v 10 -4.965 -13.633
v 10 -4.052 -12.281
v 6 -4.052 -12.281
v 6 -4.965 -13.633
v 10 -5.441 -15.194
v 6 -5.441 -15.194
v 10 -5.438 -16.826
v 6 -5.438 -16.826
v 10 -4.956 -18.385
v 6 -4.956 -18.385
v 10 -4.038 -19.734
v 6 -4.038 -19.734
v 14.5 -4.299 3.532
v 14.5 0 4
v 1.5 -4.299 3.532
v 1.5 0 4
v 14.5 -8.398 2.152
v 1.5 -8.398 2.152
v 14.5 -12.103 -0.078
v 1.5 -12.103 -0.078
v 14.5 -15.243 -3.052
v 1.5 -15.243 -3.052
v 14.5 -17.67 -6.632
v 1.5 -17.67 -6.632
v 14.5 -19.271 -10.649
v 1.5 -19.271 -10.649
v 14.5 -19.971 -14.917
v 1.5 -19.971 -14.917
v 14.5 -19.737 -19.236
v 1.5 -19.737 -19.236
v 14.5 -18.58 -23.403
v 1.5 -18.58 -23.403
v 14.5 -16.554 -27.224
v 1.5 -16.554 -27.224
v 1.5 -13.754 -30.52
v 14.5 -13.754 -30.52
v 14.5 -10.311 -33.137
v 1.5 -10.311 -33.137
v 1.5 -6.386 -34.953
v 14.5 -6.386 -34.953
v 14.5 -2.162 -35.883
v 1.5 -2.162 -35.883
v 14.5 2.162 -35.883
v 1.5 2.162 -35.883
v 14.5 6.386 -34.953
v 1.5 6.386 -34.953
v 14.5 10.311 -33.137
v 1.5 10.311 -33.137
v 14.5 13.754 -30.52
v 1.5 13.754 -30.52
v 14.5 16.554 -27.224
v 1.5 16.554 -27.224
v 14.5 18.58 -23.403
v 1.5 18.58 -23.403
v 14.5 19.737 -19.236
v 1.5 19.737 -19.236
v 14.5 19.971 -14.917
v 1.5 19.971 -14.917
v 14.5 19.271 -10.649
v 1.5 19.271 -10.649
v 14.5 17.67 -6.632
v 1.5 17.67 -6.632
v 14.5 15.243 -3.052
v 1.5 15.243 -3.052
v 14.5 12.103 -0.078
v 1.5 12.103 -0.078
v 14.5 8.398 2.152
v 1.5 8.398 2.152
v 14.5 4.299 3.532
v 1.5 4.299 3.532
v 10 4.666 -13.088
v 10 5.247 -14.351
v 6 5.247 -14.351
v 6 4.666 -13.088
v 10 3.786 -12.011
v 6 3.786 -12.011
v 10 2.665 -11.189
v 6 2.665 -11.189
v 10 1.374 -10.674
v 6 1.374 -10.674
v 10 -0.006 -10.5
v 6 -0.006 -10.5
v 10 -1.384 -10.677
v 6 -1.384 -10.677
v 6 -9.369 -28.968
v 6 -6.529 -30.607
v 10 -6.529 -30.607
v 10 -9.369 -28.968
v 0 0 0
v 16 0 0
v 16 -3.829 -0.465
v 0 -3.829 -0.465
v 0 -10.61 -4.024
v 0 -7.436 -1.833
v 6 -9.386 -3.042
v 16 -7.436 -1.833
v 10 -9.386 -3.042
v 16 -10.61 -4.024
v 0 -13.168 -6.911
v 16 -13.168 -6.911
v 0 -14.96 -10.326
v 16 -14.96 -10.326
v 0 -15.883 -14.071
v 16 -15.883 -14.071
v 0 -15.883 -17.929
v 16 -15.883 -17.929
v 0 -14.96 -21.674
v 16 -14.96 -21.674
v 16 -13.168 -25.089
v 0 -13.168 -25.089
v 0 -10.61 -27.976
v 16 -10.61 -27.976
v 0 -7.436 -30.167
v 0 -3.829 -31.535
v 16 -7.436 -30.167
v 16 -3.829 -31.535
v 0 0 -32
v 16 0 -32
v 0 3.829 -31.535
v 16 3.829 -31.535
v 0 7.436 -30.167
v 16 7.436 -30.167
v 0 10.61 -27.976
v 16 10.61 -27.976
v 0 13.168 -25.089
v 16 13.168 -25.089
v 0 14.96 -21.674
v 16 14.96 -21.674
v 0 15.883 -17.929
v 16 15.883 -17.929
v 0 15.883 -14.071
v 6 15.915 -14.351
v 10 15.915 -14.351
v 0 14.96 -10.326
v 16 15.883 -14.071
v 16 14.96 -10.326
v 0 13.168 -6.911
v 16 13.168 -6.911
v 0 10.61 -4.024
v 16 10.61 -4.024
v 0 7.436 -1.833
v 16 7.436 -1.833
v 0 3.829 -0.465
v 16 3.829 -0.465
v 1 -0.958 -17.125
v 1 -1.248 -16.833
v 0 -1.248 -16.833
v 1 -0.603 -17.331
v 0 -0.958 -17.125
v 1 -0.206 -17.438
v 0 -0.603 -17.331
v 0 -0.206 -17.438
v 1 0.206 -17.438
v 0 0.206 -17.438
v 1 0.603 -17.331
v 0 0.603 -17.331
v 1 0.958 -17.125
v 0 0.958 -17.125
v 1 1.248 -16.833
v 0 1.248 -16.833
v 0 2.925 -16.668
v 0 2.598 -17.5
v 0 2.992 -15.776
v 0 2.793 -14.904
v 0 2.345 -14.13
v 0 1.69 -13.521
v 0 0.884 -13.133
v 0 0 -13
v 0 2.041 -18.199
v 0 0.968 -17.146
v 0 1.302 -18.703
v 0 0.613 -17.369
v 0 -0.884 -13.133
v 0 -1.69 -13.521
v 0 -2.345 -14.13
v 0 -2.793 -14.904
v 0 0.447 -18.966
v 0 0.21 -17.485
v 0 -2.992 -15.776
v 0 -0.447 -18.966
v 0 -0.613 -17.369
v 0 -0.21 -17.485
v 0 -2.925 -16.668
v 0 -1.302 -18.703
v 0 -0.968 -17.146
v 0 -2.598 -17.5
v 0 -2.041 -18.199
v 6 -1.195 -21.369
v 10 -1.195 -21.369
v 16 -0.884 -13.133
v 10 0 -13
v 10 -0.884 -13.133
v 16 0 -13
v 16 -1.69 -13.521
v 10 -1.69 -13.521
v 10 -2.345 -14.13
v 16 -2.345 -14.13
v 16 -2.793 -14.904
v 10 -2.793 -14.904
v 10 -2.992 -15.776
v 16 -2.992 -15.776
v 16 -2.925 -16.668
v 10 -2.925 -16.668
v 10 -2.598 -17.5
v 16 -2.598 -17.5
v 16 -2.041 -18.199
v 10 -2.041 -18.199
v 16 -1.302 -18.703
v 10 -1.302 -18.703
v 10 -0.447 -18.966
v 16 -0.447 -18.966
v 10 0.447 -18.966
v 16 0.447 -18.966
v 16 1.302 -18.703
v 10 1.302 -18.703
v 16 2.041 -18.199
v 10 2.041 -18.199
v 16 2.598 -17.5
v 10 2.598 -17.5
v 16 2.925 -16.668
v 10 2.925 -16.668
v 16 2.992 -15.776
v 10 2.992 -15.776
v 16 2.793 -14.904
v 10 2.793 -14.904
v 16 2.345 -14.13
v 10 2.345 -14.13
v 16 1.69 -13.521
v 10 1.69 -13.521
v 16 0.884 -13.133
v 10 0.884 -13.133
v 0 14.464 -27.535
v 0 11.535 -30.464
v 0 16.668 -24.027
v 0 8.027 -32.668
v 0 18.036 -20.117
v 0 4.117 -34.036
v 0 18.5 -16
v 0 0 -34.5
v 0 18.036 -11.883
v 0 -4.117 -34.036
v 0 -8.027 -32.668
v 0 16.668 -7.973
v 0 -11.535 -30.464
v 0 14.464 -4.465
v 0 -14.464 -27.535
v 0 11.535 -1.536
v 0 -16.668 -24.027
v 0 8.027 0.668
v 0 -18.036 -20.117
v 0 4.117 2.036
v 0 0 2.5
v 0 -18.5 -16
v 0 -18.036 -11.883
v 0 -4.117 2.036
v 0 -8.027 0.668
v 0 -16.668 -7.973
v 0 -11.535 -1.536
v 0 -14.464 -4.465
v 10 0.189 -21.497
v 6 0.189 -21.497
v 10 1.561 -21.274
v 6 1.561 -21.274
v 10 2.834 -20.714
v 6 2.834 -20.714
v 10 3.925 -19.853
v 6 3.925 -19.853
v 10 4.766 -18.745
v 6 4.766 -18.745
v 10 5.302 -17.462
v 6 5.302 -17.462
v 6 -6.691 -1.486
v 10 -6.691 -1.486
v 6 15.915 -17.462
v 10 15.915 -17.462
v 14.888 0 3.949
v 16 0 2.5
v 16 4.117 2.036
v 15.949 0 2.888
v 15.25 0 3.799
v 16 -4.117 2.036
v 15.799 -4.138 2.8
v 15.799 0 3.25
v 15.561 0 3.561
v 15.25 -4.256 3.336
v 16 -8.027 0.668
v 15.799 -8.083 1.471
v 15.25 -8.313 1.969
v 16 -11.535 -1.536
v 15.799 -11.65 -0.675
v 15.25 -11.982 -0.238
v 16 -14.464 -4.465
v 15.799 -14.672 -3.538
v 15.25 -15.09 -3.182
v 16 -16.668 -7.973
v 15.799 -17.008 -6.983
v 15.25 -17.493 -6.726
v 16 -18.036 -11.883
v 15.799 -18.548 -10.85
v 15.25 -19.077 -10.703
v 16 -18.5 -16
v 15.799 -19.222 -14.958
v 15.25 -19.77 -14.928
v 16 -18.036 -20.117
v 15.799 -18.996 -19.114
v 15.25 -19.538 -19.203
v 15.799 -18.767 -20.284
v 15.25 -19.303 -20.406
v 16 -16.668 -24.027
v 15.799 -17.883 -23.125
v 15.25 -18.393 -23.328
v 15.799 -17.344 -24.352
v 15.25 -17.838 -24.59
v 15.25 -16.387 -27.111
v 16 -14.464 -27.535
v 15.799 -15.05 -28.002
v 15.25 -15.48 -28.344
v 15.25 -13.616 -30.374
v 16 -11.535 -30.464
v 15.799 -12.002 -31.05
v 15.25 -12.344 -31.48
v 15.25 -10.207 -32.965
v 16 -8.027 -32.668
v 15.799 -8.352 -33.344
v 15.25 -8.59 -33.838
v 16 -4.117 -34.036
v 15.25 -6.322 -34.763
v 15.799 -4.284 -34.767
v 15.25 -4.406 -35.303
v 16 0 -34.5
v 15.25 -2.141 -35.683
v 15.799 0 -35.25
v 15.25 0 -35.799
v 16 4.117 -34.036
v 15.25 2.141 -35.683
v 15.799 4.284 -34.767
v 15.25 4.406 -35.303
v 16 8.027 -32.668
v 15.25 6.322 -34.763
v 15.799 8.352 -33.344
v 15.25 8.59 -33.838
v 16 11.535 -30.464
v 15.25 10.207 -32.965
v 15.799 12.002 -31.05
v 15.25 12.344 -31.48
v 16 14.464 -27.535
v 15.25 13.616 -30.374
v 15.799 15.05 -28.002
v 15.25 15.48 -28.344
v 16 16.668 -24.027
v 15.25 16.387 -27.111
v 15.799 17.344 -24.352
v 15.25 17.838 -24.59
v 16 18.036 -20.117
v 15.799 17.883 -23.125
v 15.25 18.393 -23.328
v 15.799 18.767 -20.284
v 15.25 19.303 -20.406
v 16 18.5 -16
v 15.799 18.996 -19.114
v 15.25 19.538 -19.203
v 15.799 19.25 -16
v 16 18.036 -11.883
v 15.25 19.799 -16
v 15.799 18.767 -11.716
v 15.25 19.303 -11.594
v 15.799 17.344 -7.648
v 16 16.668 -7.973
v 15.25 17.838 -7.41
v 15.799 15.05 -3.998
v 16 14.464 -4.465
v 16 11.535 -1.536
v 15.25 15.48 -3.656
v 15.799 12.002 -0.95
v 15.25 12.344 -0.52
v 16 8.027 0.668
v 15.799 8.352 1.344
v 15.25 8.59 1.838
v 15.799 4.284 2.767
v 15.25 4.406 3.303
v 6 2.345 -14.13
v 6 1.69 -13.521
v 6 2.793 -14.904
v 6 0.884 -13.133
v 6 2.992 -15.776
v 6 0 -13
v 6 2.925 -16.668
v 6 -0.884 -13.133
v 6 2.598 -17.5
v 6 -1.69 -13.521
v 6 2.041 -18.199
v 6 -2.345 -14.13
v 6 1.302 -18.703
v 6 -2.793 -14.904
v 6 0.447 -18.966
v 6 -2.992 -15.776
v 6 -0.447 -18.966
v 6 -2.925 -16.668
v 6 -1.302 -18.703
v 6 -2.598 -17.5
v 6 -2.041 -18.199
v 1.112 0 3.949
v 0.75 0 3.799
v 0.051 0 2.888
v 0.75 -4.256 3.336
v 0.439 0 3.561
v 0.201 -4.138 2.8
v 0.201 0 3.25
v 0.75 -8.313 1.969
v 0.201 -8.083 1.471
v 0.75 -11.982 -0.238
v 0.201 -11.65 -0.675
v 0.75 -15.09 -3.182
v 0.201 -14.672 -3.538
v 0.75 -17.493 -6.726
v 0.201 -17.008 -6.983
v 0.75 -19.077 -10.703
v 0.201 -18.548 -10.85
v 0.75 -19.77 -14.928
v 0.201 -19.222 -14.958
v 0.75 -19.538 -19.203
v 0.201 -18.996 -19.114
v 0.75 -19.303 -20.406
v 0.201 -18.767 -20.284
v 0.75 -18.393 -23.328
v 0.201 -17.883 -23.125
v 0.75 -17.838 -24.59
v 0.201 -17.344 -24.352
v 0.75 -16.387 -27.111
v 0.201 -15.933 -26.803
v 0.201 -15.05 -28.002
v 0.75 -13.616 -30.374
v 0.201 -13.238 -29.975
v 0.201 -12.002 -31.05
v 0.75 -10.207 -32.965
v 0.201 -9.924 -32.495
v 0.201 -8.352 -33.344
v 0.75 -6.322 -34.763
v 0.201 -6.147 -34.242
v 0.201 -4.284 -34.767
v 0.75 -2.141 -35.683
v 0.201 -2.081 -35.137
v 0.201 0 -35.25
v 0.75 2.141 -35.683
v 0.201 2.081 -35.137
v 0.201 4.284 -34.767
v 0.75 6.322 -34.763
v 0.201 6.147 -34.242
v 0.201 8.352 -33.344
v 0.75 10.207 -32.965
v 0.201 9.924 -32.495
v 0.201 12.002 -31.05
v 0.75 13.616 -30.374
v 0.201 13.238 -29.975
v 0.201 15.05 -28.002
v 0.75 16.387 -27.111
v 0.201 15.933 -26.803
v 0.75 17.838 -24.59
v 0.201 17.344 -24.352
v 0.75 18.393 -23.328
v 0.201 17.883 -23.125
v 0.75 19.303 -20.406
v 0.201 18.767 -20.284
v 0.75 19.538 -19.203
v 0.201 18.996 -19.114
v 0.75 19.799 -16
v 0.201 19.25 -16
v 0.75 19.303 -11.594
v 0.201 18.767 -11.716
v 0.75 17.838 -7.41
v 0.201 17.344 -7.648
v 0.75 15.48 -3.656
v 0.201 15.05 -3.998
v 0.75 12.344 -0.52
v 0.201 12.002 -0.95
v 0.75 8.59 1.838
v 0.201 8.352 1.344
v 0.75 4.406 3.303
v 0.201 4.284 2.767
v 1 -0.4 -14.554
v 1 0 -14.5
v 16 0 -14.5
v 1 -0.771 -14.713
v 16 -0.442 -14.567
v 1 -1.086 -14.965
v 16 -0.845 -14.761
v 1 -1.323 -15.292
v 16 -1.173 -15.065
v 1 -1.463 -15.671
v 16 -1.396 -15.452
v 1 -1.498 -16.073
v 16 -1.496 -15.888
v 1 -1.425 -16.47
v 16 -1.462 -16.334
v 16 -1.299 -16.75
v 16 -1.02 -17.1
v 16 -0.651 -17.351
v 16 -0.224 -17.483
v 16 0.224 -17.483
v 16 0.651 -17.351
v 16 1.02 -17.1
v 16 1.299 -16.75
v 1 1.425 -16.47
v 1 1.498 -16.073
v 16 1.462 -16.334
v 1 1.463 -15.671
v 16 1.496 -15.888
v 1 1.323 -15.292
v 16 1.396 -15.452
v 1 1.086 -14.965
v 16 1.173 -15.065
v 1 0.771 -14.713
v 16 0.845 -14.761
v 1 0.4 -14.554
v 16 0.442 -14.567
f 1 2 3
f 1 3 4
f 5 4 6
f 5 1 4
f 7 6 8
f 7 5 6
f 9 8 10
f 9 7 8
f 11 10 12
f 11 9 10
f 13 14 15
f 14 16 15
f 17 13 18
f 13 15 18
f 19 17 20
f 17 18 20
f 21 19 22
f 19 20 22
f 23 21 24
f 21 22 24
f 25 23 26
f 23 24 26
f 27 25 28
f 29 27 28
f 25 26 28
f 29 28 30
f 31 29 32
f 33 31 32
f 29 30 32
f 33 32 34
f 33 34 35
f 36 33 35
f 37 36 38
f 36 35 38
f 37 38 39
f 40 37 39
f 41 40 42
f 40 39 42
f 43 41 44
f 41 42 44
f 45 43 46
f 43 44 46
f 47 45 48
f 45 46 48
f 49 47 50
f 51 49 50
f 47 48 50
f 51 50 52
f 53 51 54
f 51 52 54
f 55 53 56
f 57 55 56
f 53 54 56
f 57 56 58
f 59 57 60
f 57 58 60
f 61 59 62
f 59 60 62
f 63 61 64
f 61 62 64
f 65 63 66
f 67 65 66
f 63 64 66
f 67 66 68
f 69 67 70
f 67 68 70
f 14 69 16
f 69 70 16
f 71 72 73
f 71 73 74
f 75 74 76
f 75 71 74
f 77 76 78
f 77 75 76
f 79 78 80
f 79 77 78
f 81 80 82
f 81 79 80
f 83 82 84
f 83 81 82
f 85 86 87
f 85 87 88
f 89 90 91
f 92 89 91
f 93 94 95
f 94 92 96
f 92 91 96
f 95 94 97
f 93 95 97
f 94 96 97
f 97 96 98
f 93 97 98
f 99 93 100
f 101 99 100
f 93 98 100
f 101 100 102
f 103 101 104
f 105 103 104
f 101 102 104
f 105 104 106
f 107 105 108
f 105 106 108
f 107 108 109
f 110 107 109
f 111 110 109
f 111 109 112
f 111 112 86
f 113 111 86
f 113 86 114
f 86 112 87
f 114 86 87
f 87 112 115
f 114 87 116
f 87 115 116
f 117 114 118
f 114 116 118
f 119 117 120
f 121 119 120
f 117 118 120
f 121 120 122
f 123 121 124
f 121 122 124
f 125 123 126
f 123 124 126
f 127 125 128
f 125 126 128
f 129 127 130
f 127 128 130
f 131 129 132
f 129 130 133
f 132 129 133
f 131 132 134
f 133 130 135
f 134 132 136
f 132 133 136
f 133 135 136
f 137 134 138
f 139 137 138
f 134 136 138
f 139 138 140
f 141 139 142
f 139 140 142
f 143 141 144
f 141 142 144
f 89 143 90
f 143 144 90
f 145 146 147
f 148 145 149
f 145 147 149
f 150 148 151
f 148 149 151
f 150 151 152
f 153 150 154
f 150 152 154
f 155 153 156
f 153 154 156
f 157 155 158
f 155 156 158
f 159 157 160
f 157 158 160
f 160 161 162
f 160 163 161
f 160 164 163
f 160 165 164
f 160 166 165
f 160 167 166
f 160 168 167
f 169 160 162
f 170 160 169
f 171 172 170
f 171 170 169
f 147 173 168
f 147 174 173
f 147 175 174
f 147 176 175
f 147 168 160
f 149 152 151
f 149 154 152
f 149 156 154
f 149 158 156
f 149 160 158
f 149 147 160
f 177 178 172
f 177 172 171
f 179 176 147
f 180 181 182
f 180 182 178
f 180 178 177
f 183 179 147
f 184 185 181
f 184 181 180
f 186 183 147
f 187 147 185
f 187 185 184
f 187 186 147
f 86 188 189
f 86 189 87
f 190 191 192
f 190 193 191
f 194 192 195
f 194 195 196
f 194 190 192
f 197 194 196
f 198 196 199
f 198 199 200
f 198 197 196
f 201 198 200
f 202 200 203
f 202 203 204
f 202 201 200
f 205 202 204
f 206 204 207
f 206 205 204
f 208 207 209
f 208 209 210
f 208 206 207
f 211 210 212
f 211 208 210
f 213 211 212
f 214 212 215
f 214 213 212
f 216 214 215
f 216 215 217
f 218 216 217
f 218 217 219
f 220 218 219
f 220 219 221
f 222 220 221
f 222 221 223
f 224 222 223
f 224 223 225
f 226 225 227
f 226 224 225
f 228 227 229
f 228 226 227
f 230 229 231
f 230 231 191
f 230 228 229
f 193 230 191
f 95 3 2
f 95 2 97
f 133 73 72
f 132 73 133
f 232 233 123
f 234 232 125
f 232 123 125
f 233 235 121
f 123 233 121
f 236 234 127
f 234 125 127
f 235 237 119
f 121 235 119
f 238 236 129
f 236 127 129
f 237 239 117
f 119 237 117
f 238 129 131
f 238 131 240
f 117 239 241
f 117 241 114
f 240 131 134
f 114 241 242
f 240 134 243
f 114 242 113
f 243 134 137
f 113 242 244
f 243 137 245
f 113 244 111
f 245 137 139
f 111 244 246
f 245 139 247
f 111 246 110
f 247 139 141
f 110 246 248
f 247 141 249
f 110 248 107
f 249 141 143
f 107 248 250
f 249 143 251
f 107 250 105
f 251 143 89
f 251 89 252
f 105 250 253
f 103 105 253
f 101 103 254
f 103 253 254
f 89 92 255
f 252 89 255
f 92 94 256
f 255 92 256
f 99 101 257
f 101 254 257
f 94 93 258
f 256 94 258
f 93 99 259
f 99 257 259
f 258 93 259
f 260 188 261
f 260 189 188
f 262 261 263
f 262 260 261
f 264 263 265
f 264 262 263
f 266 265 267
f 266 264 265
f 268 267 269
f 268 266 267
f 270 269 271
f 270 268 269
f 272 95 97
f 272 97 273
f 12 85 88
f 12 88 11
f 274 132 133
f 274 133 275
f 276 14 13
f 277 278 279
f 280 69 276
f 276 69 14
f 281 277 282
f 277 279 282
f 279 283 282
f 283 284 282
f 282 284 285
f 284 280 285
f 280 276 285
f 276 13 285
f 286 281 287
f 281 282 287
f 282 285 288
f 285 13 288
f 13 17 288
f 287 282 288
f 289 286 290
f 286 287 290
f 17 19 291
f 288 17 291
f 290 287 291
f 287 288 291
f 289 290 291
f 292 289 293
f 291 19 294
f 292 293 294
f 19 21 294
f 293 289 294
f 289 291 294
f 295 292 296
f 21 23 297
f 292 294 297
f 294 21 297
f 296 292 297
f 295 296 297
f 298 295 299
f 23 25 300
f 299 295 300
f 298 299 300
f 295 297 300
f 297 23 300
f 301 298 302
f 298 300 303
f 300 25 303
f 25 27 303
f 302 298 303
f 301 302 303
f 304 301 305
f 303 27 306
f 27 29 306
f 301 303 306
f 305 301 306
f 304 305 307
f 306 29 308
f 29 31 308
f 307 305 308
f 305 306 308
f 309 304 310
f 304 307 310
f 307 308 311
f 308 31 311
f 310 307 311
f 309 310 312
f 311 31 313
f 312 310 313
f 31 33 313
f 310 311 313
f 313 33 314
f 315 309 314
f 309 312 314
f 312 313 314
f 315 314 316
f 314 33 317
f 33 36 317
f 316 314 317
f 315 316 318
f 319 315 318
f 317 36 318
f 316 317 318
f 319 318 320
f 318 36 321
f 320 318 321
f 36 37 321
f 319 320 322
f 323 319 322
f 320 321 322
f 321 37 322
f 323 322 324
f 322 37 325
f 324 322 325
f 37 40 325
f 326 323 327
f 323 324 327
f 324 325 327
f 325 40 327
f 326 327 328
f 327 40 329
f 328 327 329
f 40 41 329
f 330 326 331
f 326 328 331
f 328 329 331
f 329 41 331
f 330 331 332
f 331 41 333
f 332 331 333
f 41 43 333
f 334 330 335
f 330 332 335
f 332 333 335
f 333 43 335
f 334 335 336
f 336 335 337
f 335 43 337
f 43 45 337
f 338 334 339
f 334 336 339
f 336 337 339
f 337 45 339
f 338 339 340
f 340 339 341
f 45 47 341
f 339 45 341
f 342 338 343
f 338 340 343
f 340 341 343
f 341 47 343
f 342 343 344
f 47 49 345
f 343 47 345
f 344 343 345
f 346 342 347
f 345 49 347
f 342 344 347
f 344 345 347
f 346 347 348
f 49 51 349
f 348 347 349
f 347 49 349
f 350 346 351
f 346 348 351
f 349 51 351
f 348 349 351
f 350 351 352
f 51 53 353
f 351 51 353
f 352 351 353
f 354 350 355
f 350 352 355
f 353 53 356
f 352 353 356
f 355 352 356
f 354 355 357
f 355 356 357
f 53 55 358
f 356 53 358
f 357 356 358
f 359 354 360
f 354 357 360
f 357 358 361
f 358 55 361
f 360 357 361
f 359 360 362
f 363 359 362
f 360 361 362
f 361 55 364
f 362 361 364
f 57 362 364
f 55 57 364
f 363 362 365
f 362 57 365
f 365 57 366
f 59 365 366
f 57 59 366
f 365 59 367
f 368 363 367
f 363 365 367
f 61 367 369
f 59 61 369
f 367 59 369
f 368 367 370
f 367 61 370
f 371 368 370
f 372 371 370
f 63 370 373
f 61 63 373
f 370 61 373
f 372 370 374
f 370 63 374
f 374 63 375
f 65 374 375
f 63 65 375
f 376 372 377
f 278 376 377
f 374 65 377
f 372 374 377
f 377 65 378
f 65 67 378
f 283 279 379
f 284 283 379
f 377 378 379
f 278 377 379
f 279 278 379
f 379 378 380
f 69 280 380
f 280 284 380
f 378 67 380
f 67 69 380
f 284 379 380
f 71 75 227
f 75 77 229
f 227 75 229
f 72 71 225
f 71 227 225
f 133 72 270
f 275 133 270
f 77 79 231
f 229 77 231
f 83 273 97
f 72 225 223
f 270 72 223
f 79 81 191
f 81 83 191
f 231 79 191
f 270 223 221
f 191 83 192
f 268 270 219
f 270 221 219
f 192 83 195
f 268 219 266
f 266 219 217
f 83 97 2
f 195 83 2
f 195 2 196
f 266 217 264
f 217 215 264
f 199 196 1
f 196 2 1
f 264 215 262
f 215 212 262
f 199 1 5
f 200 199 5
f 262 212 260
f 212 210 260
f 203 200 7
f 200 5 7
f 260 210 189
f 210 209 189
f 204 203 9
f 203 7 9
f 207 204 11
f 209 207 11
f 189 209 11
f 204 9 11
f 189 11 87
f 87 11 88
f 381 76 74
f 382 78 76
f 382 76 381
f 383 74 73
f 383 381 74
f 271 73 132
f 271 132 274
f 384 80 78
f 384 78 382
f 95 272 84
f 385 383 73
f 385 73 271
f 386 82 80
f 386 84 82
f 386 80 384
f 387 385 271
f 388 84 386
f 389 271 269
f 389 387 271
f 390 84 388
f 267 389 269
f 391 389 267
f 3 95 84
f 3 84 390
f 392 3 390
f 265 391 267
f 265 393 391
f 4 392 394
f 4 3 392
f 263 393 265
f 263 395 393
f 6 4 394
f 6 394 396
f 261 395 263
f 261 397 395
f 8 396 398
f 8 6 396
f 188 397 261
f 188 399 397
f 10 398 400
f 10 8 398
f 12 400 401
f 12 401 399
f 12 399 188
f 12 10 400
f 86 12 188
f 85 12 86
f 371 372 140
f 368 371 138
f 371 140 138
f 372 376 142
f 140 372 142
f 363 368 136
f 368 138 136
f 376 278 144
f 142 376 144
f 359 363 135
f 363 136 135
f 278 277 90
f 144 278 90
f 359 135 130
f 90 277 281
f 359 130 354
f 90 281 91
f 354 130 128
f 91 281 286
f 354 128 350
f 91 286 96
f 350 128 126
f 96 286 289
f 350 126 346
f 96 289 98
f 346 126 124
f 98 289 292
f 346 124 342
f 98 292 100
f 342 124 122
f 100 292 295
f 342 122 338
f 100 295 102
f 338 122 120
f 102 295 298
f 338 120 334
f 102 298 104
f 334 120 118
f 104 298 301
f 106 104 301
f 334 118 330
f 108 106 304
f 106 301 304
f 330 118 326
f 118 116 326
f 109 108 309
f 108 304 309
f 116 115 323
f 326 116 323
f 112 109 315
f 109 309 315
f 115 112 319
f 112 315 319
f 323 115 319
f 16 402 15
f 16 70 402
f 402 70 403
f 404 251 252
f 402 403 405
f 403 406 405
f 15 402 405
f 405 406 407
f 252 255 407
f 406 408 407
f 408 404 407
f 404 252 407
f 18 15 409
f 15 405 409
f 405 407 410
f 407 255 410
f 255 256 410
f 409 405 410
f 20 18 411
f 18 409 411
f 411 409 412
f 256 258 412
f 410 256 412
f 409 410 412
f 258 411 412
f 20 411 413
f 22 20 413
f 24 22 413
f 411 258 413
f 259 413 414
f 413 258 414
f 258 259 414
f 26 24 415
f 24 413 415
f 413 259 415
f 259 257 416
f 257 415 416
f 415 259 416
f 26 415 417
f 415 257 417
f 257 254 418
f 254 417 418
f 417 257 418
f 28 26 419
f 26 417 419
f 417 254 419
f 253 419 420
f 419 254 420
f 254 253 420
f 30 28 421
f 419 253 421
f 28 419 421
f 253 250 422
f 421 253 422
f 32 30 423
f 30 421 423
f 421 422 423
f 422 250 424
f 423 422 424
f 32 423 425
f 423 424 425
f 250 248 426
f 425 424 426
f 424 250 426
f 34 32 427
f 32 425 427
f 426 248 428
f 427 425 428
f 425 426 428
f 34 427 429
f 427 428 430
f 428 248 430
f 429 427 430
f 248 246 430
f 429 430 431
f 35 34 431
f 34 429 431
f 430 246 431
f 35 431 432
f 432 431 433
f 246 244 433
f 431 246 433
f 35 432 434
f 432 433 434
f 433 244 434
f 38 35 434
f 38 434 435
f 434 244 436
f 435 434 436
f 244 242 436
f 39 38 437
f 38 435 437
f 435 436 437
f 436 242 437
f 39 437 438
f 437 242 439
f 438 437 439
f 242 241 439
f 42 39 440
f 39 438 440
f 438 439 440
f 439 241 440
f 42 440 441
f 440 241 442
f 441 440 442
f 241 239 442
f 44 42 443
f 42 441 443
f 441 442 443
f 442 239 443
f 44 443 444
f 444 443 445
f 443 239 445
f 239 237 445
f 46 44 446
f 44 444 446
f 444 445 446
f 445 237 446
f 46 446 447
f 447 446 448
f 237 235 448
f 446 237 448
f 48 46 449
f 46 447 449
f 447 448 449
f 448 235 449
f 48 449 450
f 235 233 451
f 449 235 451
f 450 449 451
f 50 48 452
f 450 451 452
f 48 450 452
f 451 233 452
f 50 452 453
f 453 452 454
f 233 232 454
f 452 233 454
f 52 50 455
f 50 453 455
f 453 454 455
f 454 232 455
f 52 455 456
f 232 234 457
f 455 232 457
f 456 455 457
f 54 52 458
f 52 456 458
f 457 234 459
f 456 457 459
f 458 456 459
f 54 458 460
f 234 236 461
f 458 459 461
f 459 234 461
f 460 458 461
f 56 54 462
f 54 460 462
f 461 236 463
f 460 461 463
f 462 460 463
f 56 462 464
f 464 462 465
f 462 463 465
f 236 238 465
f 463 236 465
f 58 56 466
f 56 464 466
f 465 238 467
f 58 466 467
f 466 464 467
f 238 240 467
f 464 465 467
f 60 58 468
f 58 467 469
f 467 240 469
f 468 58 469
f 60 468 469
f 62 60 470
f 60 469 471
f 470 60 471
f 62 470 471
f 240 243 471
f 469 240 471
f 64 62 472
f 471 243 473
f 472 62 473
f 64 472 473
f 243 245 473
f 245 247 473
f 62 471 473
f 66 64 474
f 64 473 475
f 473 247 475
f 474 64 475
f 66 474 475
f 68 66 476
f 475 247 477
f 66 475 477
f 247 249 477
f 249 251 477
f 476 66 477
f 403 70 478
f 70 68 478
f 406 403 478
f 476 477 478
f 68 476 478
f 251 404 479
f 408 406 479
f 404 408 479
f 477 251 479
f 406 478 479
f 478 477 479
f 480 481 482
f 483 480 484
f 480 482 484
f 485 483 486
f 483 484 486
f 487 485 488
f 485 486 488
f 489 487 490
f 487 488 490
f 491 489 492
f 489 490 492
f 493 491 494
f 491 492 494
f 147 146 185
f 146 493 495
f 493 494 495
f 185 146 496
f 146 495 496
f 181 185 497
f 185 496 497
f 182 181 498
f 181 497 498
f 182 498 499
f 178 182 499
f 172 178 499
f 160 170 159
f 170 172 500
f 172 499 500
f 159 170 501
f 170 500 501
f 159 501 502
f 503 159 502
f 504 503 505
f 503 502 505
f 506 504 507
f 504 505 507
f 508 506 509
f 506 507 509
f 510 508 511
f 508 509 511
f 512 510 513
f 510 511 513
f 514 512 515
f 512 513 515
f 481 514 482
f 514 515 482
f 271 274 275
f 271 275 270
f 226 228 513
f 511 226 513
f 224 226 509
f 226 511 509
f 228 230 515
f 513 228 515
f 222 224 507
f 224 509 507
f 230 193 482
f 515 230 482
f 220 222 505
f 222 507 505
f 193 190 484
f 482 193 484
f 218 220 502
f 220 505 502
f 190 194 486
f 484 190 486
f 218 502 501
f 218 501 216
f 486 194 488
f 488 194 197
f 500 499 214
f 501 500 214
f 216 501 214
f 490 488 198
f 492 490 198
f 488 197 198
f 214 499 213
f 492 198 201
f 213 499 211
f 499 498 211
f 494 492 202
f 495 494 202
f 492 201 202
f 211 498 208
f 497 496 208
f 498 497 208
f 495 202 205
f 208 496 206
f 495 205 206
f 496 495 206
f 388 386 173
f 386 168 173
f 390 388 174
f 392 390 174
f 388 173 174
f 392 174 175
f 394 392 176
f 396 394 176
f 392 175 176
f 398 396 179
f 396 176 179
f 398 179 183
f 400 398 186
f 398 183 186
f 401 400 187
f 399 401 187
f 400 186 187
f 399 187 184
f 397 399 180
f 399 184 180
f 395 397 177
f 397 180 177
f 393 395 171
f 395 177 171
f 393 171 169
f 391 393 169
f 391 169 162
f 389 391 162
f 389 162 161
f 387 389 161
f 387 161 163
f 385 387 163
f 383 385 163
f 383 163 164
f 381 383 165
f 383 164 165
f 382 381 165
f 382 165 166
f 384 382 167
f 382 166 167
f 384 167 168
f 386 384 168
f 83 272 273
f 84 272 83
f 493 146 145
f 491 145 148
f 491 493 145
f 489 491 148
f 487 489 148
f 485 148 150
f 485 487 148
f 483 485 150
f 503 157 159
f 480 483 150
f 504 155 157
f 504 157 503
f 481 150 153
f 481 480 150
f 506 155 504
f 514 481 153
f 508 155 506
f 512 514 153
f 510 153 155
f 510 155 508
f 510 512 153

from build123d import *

# Parameters (mm, degrees)
F0_W     = 4
F0_H     = 1.5
F0_W_2   = 6
F0_H_2   = 2.5
F3_DEPTH = 4
F4_R     = 1.5666851265
F5_DEPTH = 1


with BuildPart() as f1:
    # F0 (on Front) → F1 (revolve)
    with BuildSketch(Plane.XZ):
        with BuildLine():
            Line((0, 2.5), (0, 0))
            Line((0, 0), (6, 0))
            Line((6, 0), (10, 0))
            Line((10, 0), (16, 0))
            Line((16, 0), (16, 2.5))
            ThreePointArc((16, 2.5), (15.5606601718, 3.5606601718), (14.5, 4))
            Line((14.5, 4), (1.5, 4))
            ThreePointArc((1.5, 4), (0.4393398282, 3.5606601718), (0, 2.5))
        make_face()
    revolve(axis=Axis((8, 0, -16), (1, 0, 0)))



with BuildPart() as f1b:
    # F0 (on Front) → F1, piece 2 (revolve)
    with BuildSketch(Plane.XZ):
        with Locations((8, -13.75)):
            Rectangle(F0_W, F0_H)
        with Locations((3, -13.75)):
            Rectangle(F0_W_2, F0_H)
        with Locations((8, -11.75)):
            Rectangle(F0_W, F0_H_2)
        with Locations((13, -13.75)):
            Rectangle(F0_W_2, F0_H)
    revolve(axis=Axis((8, 0, -16), (1, 0, 0)))


with BuildPart() as f1_1:
    add(f1.part)

    add(f1b.part)  # F3 merges F1b
    # F2 (on face) → F3 (join)
    with BuildSketch(Plane(origin=(6, 0, 0), x_dir=(0, -1, 0), z_dir=(-1, 0, 0))):
        with BuildLine():
            Line((6.6908253366, -1.4861596642), (1.3844372123, -10.6770935002))
            ThreePointArc((1.3844372123, -10.6770935002), (2.8339033039, -11.2862974145), (4.051778006, -12.2807131073))
            Line((4.051778006, -12.2807131073), (9.3857185908, -3.0420570099))
            Line((9.3857185908, -3.0420570099), (6.6908253366, -1.4861596642))
        make_face()
        with BuildLine():
            ThreePointArc((4.037854872, -19.7343979479), (2.741097896, -20.7682682731), (1.1951079301, -21.36858613))
            Line((1.1951079301, -21.36858613), (6.5290485149, -30.6072422274))
            Line((6.5290485149, -30.6072422274), (9.3687329614, -28.9677496478))
            Line((9.3687329614, -28.9677496478), (4.037854872, -19.7343979479))
        make_face()
        with BuildLine():
            ThreePointArc((-5.3019908569, -17.4624954541), (-5.4991378368, -15.9026190397), (-5.246885936, -14.3507007627))
            Line((-5.246885936, -14.3507007627), (-15.9147671056, -14.3507007627))
            Line((-15.9147671056, -14.3507007627), (-15.9147671056, -17.4624954541))
            Line((-15.9147671056, -17.4624954541), (-5.3019908569, -17.4624954541))
        make_face()
    extrude(amount=-F3_DEPTH)

    # F4 (on Right) → F5 (join)
    with BuildSketch(Plane.YZ):
        with Locations((0, -15.8851090819)):
            Circle(F4_R)
    extrude(amount=F5_DEPTH)


solid = f1_1.part
